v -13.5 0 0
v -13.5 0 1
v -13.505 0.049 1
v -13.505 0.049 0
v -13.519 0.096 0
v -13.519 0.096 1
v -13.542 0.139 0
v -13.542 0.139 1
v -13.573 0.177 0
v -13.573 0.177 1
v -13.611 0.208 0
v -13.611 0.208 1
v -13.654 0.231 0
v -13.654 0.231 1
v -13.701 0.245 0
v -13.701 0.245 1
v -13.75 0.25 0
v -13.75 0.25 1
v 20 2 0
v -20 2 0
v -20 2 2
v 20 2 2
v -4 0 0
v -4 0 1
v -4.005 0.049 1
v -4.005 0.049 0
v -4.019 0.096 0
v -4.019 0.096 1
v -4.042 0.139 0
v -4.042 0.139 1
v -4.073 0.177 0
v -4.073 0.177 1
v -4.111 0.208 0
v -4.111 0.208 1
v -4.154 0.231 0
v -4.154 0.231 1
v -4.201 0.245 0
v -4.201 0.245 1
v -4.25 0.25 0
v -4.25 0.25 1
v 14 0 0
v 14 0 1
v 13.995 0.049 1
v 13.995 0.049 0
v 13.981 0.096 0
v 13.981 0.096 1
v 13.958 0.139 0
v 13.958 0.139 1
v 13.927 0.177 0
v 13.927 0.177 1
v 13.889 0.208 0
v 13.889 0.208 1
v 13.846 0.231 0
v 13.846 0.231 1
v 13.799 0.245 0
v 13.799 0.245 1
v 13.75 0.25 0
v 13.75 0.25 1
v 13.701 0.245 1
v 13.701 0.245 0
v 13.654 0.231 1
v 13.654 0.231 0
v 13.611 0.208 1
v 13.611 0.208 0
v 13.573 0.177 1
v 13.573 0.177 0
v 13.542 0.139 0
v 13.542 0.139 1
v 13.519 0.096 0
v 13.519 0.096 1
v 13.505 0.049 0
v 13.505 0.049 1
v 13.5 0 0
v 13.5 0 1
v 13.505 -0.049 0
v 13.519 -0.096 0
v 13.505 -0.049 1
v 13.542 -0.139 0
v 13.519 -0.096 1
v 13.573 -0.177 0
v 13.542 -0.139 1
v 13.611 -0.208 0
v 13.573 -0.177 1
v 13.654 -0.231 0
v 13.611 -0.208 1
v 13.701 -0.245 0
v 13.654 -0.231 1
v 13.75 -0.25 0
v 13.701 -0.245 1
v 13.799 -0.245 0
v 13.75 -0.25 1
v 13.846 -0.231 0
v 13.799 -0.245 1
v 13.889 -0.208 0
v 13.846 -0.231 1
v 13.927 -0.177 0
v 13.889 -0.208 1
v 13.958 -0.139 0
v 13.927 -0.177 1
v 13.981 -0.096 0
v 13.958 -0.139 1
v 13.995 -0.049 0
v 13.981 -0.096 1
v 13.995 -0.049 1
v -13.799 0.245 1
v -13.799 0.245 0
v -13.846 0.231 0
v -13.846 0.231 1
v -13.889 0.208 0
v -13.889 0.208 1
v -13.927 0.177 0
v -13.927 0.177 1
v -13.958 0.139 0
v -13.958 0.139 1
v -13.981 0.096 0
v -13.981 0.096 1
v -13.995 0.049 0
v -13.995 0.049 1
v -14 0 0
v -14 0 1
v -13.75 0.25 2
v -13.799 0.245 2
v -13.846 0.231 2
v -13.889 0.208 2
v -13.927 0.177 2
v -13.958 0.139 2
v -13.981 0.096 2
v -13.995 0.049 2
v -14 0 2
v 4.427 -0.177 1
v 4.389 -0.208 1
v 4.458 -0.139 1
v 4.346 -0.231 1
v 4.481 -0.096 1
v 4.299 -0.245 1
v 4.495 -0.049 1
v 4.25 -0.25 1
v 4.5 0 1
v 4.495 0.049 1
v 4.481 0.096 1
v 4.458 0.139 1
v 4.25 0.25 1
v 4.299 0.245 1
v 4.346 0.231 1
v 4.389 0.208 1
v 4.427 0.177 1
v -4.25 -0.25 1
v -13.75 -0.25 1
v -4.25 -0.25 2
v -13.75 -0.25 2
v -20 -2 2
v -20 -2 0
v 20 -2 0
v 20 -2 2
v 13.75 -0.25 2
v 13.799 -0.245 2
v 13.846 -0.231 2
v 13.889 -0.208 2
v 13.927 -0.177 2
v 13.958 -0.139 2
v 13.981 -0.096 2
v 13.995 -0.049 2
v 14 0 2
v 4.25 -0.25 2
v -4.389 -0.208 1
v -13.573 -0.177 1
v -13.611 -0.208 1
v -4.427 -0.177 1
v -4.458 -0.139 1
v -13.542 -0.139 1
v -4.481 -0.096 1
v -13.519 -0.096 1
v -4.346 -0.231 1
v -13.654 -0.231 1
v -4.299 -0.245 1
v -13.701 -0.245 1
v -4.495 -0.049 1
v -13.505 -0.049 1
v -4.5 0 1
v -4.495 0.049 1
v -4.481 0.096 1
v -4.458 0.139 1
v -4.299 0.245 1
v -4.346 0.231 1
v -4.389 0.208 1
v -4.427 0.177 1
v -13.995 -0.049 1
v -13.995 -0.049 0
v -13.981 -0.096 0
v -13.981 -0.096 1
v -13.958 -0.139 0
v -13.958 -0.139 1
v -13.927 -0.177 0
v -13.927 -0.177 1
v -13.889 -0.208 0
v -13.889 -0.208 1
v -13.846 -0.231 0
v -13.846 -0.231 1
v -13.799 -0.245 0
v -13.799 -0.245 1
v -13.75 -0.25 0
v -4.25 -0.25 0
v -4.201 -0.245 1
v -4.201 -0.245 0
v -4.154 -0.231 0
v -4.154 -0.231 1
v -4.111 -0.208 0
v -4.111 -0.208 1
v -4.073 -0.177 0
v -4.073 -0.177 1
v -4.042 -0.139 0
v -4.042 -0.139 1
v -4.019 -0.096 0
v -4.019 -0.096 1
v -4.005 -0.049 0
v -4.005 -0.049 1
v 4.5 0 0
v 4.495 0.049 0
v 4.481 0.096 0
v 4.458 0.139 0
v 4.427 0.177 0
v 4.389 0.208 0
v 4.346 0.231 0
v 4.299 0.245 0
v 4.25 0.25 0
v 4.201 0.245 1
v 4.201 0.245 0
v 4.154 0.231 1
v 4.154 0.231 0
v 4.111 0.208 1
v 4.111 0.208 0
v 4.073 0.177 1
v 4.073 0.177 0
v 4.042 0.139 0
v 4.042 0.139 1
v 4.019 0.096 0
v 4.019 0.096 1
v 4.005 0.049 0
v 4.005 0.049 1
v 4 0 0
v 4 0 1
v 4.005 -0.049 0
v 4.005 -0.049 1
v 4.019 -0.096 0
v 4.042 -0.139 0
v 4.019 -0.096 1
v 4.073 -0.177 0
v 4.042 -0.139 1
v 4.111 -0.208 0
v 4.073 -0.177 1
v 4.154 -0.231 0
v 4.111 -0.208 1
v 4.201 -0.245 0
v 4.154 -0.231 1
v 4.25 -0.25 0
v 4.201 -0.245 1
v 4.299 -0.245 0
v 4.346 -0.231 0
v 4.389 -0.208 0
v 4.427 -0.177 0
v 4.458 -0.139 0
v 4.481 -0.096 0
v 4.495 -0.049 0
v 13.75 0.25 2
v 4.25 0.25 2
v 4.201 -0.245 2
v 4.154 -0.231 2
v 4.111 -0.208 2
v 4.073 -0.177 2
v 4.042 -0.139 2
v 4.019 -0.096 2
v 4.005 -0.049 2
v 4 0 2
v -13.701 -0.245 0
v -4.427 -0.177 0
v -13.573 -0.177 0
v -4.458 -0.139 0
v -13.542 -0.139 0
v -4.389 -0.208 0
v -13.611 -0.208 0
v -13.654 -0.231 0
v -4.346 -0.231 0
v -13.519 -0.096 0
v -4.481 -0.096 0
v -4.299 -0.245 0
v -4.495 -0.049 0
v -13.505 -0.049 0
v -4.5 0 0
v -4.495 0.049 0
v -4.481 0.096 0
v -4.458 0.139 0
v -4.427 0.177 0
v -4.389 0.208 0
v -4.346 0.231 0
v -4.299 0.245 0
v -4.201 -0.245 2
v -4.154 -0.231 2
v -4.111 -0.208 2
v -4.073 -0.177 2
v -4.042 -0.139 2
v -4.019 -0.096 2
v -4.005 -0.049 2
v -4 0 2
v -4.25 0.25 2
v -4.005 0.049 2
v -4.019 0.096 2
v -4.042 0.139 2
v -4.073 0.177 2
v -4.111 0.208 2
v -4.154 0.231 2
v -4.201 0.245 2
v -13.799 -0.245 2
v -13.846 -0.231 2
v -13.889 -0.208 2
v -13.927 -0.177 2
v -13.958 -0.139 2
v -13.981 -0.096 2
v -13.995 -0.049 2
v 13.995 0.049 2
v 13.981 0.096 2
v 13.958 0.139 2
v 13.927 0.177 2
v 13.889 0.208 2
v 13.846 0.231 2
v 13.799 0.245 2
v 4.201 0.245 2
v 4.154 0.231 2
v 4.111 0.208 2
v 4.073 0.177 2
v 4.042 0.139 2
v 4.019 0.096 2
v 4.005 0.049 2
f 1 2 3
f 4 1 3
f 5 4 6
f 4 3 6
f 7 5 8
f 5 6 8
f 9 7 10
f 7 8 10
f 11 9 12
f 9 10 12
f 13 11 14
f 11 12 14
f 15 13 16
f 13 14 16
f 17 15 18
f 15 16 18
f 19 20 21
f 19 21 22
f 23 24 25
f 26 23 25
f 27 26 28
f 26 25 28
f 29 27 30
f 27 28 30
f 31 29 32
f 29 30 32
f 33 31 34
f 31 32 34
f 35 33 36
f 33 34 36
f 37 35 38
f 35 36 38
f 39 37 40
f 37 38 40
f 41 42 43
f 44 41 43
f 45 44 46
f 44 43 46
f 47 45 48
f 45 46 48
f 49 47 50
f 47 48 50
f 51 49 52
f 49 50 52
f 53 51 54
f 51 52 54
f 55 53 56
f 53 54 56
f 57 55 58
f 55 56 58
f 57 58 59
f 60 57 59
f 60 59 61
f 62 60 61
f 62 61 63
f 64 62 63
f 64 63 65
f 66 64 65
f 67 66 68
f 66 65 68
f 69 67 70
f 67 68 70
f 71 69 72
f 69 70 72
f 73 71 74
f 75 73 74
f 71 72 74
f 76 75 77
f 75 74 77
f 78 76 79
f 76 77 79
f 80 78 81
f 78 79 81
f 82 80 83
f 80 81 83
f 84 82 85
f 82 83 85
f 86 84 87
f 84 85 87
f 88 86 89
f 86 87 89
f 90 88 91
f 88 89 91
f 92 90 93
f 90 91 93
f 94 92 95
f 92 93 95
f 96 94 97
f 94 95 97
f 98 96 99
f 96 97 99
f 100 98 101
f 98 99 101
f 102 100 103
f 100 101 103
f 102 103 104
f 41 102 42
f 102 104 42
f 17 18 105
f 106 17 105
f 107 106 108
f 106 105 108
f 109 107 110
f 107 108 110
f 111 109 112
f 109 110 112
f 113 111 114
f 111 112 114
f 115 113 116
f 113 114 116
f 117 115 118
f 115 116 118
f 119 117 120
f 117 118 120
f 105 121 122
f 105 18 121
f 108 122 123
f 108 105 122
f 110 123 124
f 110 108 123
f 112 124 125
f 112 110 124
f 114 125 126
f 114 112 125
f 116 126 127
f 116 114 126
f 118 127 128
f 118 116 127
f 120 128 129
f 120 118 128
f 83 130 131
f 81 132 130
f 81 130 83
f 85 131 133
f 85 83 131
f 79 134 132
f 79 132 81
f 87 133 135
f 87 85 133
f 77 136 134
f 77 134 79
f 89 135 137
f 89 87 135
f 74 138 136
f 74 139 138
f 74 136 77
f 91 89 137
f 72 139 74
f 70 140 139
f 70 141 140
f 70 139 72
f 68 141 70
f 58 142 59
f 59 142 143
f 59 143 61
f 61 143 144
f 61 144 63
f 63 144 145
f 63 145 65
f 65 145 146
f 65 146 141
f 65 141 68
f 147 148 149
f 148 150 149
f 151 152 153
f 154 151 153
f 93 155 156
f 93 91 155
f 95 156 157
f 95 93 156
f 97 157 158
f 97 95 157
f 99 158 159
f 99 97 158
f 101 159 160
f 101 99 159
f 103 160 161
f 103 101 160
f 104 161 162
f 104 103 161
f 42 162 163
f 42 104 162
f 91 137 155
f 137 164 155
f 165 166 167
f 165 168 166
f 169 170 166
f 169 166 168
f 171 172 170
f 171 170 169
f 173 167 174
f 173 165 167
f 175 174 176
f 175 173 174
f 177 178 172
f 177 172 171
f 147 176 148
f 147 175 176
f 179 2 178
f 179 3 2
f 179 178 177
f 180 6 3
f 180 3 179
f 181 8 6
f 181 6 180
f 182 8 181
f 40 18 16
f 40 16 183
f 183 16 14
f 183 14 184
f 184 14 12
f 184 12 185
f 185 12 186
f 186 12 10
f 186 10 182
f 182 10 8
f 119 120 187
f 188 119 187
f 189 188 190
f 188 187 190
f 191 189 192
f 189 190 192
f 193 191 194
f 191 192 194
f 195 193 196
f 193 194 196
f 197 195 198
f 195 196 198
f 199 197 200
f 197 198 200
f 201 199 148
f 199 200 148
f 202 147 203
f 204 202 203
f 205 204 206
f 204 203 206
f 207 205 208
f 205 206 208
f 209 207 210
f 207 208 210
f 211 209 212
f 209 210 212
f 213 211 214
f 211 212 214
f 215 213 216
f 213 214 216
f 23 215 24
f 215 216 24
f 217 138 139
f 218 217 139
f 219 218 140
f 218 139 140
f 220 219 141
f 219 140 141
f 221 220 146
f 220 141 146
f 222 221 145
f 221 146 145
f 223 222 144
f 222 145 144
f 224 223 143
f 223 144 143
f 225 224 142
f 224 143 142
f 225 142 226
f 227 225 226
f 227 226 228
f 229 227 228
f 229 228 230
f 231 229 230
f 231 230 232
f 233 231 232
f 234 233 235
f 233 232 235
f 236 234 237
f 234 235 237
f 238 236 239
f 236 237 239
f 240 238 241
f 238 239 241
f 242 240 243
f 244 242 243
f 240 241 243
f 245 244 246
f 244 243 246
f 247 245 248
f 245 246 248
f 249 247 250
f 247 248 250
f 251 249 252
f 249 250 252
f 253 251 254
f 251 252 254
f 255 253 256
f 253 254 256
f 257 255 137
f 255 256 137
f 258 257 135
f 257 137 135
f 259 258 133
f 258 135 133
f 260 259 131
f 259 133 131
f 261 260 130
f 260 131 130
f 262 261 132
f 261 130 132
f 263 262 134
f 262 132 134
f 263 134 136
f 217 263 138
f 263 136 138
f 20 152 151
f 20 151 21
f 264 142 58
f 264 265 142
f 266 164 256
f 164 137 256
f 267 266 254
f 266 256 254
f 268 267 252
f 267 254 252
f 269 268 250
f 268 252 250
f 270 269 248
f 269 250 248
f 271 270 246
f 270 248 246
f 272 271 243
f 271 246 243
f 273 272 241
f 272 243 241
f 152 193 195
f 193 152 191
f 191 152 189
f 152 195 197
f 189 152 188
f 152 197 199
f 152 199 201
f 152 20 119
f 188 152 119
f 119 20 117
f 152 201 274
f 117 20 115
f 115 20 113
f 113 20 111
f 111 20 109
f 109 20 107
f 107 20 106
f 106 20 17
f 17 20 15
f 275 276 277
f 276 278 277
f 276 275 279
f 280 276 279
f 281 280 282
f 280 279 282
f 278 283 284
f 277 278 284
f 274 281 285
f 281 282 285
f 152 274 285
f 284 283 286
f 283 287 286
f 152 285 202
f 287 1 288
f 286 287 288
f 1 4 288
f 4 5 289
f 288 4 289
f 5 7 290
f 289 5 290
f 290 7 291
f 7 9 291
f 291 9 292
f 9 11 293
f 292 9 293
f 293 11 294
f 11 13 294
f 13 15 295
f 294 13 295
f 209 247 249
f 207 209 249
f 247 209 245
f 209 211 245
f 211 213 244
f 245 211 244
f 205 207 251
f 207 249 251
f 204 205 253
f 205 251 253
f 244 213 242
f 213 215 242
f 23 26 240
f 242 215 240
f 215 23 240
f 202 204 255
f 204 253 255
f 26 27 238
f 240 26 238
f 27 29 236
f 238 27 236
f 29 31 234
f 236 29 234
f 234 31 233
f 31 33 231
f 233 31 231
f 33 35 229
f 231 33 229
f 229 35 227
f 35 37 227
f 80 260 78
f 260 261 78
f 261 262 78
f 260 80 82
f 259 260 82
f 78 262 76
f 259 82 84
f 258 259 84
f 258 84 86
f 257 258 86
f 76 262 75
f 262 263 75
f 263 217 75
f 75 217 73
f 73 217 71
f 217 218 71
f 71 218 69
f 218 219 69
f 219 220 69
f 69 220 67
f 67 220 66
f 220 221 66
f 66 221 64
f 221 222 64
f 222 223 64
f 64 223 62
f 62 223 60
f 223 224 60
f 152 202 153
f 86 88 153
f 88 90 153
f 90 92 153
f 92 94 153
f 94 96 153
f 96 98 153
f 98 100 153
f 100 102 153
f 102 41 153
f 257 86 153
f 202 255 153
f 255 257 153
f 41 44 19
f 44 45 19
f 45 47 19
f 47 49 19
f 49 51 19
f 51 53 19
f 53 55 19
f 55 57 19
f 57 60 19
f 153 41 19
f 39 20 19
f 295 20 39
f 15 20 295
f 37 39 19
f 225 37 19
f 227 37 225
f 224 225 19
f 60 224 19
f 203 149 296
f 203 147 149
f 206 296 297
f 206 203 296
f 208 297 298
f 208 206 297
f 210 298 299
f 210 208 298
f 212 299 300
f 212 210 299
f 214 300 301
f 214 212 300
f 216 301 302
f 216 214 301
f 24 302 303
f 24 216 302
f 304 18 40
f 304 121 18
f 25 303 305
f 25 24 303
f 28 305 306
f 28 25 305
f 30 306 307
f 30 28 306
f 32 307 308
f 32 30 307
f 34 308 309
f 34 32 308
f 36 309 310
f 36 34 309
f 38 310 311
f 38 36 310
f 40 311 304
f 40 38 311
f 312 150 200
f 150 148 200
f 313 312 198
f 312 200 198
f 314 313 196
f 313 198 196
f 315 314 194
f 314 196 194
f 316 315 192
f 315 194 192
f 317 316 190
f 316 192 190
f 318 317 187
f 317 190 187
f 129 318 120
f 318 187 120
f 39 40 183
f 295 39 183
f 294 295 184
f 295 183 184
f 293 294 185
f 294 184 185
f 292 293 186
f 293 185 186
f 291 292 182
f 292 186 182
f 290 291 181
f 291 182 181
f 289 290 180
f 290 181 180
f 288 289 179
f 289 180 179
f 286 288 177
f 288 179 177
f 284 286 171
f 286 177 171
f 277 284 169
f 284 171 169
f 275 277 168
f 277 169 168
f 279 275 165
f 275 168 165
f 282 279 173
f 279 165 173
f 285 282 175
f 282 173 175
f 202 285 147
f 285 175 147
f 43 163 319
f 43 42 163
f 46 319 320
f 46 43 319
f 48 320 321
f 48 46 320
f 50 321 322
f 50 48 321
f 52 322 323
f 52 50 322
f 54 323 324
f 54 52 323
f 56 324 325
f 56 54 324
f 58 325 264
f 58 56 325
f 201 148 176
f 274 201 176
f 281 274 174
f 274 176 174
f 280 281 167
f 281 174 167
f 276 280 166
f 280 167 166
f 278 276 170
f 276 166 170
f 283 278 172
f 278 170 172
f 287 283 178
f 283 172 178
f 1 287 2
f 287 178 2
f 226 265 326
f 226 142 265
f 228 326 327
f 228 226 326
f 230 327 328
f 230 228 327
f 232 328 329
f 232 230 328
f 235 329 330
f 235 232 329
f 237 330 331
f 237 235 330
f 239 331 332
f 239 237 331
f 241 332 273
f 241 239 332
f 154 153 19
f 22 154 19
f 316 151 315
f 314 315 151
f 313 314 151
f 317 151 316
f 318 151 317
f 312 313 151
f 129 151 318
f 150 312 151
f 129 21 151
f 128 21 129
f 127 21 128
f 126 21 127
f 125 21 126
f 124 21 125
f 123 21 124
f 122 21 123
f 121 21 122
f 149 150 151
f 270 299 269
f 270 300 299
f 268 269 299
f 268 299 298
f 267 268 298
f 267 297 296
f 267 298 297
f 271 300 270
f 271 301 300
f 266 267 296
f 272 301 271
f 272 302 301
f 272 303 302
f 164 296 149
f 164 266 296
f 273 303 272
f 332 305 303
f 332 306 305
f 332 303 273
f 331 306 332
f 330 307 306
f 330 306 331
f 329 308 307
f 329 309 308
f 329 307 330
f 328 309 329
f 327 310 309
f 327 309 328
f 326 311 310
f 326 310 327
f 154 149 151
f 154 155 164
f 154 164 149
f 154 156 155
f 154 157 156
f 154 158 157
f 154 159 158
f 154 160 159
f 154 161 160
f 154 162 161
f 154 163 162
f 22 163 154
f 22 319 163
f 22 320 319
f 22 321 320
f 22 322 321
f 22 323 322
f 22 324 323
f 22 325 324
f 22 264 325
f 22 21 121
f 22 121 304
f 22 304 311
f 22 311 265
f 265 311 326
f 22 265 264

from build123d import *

# Parameters (mm, degrees)
F0_W     = 40
F0_H     = 4
F1_DEPTH = 2
F2_W     = 10
F2_H     = 0.5
F3_DEPTH = 1
F4_R     = 0.25
F5_DEPTH = 25
F6_R     = 0.24999


# Not quite as in the source:
# - a fillet or chamfer is up to 0.001 mm smaller than in the source, because OpenCascade refuses the exact size


with BuildPart() as f1:
    # F0 (on Top) → F1 (new body)
    with BuildSketch(Plane.XY):
        Rectangle(F0_W, F0_H)
    extrude(amount=F1_DEPTH)

    # F2 (on face) → F3 (cut)
    with BuildSketch(Plane.XY.offset(2)):
        with Locations((-9, 0)):
            Rectangle(F2_W, F2_H)
        with Locations((9, 0)):
            Rectangle(F2_W, F2_H)
    extrude(amount=-F3_DEPTH, mode=Mode.SUBTRACT)

    # F4 (on face) → F5 (cut)
    with BuildSketch(Plane.XY.offset(1)):
        with BuildLine():
            ThreePointArc((-13.75, -0.25), (-13.5732233047, -0.1767766953), (-13.5, 0))
            ThreePointArc((-13.5, 0), (-13.5732233047, 0.1767766953), (-13.75, 0.25))
            ThreePointArc((-13.75, 0.25), (-13.9267766953, 0.1767766953), (-14, 0))
            ThreePointArc((-14, 0), (-13.9267766953, -0.1767766953), (-13.75, -0.25))
        make_face()
        with BuildLine():
            ThreePointArc((-4, 0), (-4.0732233047, 0.1767766953), (-4.25, 0.25))
            ThreePointArc((-4.25, 0.25), (-4.5, 0), (-4.25, -0.25))
            ThreePointArc((-4.25, -0.25), (-4.0732233047, -0.1767766953), (-4, 0))
        make_face()
        with Locations((13.75, 0)):
            Circle(F4_R)
        with Locations((4.25, 0)):
            Circle(F4_R)
    extrude(amount=-F5_DEPTH, mode=Mode.SUBTRACT)

    # F6 (radius 0.25 in the source; OpenCascade refuses exactly that, so slightly less here)
    f6_edges = [f1.edges().sort_by_distance(p)[0] for p in [
        (14, 0.25, 1.5),
        (14, -0.25, 1.5),
        (4, -0.25, 1.5),
        (4, 0.25, 1.5),
        (-14, 0.25, 1.5),
        (-14, -0.25, 1.5),
        (-4, 0.25, 1.5),
        (-4, -0.25, 1.5),
    ]]
    fillet(f6_edges, radius=F6_R)


solid = f1.part
